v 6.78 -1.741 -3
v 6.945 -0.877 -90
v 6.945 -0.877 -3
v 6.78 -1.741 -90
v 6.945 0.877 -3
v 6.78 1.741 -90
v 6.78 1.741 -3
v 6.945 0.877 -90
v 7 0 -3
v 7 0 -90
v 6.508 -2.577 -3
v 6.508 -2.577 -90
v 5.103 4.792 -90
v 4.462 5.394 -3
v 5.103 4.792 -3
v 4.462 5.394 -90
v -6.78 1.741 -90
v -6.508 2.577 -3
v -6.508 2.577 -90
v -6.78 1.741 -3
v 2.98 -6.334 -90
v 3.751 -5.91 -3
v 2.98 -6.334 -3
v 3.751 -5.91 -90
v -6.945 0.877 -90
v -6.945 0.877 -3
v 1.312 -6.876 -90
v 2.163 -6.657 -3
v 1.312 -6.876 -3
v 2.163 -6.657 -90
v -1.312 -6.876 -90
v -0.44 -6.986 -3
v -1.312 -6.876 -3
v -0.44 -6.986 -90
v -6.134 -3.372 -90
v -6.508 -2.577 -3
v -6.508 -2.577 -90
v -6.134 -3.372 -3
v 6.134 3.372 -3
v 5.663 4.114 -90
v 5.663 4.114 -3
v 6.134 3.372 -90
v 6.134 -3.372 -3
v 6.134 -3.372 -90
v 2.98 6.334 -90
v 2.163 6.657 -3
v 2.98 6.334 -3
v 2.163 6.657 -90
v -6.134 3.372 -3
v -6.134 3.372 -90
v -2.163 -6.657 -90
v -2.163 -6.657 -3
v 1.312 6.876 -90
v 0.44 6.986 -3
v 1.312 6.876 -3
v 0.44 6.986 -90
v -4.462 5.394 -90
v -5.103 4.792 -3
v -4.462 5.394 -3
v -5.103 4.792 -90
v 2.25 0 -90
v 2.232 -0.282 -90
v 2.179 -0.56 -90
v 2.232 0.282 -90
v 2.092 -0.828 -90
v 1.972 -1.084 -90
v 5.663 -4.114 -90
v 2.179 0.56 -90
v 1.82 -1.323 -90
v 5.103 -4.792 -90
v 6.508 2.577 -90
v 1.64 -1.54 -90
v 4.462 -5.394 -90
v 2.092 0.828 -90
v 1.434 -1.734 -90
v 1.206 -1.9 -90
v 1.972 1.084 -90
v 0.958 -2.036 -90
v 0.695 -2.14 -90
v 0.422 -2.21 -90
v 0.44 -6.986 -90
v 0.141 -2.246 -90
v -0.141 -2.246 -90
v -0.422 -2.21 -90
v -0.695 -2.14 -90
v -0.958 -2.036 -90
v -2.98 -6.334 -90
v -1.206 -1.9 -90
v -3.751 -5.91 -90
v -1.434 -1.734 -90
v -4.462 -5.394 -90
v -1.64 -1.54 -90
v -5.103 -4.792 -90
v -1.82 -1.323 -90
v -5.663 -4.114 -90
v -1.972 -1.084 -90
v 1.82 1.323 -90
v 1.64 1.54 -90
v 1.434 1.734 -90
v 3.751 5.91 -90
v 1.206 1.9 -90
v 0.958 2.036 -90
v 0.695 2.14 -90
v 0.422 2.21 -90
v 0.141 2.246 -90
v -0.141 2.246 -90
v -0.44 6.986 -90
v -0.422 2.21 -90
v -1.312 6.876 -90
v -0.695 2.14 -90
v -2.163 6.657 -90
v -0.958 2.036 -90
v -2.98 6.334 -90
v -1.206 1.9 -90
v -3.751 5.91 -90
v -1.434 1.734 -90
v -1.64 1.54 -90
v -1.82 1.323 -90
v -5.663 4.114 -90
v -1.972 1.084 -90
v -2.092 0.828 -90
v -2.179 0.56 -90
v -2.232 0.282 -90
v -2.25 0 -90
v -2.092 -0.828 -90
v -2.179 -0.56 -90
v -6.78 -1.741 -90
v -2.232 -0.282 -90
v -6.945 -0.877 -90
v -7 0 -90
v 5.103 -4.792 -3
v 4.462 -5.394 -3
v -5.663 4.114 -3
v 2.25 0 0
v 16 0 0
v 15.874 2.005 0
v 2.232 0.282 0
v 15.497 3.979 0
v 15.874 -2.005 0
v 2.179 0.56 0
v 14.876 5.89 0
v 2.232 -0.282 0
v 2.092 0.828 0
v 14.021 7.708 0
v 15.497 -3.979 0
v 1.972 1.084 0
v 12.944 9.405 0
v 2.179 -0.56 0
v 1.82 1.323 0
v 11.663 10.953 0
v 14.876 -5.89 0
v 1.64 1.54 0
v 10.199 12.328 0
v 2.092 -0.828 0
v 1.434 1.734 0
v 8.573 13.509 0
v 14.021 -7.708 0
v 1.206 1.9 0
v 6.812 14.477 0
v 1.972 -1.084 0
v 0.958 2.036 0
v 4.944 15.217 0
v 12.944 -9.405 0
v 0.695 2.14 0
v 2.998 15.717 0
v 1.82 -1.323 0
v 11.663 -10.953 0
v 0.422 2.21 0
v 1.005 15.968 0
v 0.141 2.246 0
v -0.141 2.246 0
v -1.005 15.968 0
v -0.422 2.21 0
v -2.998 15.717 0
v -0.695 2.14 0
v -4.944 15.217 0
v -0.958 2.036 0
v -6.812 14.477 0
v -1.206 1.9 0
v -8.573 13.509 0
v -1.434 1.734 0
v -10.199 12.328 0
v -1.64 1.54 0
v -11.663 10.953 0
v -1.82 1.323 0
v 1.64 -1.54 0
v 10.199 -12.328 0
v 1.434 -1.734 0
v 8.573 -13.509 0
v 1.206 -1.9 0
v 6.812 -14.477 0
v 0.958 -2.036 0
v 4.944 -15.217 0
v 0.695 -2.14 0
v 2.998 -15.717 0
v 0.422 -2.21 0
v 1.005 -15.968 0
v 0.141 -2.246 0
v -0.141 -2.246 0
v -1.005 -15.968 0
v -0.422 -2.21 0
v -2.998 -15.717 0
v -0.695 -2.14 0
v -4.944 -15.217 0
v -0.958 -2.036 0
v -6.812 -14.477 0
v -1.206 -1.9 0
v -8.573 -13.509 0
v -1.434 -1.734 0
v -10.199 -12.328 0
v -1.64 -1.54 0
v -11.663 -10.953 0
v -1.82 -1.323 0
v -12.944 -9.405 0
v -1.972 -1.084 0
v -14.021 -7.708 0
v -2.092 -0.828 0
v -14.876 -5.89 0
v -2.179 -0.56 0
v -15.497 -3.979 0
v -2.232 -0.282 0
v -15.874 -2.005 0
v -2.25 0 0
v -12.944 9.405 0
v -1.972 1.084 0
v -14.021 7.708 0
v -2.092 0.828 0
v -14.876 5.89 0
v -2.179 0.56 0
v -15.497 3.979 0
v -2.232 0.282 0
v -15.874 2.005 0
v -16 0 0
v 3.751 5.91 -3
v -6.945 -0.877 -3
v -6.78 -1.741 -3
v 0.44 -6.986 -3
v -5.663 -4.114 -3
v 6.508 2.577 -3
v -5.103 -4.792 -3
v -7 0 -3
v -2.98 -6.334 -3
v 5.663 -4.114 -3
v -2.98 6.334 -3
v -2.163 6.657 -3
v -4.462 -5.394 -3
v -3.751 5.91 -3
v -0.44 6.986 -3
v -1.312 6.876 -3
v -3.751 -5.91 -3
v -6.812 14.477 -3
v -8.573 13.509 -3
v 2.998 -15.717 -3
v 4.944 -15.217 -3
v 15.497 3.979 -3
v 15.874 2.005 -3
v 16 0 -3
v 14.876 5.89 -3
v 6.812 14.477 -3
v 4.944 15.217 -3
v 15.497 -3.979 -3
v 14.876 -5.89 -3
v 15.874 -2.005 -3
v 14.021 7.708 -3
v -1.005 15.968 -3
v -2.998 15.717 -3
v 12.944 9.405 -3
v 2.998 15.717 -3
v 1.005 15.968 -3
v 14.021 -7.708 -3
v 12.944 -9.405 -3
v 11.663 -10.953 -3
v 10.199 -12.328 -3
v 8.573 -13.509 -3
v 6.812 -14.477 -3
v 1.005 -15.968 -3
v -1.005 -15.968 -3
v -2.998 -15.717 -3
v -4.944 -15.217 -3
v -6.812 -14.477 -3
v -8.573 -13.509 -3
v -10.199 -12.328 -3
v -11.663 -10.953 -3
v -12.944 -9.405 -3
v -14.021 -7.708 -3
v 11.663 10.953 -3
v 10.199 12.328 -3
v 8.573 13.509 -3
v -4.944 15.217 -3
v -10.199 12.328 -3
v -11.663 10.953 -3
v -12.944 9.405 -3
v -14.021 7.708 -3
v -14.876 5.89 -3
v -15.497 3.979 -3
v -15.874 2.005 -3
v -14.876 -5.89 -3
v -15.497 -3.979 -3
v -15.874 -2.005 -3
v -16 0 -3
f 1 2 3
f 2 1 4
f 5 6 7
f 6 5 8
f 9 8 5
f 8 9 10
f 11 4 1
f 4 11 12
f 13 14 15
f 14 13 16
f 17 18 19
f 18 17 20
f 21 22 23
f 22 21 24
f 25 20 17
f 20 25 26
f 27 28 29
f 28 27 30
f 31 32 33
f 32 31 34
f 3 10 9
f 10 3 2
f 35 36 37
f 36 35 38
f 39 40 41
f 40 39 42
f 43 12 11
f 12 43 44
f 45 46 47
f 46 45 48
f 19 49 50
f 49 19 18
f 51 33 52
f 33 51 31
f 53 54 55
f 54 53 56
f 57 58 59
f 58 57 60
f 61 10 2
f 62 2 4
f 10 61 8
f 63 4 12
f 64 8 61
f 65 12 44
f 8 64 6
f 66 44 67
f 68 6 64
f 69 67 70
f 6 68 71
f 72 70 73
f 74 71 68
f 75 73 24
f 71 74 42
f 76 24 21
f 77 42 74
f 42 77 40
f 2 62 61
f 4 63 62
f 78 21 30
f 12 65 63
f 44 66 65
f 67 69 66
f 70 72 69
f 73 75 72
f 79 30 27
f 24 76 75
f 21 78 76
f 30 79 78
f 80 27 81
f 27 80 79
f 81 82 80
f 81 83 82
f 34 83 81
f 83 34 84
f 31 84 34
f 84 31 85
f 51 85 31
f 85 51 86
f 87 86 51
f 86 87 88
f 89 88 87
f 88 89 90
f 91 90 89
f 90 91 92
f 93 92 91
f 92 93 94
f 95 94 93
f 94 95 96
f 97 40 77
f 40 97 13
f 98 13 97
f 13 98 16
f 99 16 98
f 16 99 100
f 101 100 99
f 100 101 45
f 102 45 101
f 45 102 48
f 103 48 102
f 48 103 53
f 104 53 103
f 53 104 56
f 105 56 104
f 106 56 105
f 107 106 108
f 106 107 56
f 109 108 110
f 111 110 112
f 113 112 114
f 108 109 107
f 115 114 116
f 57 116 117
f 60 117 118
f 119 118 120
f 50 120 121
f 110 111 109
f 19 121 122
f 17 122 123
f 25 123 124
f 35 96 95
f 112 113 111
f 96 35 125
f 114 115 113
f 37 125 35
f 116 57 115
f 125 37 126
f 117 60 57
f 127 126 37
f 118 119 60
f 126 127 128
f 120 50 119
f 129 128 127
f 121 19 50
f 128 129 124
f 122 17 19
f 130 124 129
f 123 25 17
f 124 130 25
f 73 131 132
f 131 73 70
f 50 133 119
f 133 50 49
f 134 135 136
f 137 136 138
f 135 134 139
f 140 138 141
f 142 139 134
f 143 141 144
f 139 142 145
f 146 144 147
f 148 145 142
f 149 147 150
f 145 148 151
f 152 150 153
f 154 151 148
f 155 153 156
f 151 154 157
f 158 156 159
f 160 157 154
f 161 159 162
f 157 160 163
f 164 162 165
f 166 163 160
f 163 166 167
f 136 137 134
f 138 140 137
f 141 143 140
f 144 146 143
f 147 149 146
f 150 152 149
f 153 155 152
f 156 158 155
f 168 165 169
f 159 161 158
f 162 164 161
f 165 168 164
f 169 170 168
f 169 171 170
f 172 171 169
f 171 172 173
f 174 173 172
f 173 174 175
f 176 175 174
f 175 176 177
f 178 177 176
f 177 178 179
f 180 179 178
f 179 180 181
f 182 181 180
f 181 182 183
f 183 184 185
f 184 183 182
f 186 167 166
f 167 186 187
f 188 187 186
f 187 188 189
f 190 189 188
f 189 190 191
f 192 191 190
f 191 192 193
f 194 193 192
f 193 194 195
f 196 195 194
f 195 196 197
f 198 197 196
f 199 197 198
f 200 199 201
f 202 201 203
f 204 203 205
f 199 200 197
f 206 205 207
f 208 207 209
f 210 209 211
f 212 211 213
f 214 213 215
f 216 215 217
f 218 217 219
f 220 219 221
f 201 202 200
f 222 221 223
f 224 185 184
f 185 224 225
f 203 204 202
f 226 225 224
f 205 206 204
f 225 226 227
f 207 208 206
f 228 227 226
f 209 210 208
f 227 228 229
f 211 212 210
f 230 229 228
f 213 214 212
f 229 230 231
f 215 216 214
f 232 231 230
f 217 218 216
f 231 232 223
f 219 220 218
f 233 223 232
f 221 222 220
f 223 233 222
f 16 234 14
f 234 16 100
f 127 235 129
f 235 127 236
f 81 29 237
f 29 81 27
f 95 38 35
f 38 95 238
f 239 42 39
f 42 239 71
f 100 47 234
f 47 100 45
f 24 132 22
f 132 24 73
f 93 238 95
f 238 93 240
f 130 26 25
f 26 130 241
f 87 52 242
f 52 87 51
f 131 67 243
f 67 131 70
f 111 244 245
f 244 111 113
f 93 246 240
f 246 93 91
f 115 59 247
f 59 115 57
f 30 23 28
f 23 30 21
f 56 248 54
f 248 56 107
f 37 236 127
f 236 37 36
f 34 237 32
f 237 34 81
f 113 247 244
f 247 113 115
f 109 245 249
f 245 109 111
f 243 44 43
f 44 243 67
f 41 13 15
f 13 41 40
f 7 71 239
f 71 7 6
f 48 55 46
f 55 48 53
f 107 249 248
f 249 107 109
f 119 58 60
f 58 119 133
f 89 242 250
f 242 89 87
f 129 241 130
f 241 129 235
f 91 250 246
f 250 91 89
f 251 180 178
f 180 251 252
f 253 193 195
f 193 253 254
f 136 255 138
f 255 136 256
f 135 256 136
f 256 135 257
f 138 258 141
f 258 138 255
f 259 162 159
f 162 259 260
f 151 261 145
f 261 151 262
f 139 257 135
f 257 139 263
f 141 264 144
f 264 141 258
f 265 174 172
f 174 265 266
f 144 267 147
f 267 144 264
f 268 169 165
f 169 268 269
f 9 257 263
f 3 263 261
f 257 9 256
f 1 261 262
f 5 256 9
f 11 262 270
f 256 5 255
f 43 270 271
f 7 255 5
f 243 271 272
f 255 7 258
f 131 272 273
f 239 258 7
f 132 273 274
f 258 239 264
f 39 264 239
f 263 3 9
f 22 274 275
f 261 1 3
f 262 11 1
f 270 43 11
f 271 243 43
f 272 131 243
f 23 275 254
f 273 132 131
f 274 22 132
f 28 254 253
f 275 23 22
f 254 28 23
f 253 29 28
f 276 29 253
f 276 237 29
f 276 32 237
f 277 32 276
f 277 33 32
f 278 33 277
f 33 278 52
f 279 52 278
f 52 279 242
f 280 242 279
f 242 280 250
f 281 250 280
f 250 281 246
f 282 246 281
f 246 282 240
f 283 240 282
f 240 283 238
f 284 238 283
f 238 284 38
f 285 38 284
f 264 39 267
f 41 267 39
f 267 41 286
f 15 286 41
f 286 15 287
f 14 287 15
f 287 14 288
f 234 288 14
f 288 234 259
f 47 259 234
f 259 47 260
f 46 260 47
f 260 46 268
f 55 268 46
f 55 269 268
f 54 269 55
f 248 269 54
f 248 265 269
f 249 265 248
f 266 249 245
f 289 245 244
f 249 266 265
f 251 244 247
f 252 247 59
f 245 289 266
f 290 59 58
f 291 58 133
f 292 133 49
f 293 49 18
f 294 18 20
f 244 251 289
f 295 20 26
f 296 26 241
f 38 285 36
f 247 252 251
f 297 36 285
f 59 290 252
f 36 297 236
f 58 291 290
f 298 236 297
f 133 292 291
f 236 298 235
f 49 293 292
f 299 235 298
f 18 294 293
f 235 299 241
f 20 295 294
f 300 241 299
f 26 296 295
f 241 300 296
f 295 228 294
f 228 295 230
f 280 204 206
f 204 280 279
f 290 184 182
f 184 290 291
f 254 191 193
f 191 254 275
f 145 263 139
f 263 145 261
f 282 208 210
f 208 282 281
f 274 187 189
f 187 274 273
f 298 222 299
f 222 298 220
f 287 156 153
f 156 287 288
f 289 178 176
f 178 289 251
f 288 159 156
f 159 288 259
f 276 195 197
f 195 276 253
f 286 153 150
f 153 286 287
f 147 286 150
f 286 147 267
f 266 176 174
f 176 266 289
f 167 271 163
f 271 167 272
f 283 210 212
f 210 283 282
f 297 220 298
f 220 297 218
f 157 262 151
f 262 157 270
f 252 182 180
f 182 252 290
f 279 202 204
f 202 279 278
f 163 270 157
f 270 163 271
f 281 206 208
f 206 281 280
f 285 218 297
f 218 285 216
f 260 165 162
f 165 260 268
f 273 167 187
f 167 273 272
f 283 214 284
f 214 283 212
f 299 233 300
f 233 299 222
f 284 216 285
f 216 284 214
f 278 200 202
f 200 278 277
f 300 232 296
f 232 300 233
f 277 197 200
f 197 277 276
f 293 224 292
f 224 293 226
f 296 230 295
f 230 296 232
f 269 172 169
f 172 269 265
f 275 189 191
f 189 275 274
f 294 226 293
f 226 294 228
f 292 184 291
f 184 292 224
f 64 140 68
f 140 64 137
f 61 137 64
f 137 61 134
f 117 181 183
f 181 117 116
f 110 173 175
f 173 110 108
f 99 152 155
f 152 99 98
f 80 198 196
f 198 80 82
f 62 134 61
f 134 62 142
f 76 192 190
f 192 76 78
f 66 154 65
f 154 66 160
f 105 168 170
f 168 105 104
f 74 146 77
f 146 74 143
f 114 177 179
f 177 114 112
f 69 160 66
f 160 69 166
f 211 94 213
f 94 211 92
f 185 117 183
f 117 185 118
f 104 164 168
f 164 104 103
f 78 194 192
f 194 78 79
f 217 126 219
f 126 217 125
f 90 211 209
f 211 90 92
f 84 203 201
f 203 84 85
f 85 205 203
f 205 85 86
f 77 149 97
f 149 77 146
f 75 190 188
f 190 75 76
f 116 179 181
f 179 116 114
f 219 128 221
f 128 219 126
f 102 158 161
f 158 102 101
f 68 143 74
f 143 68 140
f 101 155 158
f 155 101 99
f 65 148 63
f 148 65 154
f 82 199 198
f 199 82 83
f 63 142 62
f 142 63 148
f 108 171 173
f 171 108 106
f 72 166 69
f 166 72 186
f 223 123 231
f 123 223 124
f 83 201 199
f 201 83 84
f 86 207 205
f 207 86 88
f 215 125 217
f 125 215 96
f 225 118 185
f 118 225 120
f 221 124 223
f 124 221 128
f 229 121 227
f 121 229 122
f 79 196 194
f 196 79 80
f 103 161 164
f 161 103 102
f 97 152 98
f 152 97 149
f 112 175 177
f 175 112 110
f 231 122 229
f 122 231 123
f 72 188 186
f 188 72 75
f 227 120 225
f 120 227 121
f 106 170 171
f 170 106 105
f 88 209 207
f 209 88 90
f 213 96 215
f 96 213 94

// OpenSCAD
$fn = 50;


difference() {
	union() {
		translate(v = [0, 0, -90.0000000000]) {
			cylinder(h = 90, r = 7.0000000000);
		}
		translate(v = [0, 0, -3.0000000000]) {
			cylinder(h = 3, r = 16.0000000000);
		}
	}
	union() {
		#translate(v = [0, 0, -90]) {
			cylinder(h = 90, r = 2.2500000000);
		}
	}
}
